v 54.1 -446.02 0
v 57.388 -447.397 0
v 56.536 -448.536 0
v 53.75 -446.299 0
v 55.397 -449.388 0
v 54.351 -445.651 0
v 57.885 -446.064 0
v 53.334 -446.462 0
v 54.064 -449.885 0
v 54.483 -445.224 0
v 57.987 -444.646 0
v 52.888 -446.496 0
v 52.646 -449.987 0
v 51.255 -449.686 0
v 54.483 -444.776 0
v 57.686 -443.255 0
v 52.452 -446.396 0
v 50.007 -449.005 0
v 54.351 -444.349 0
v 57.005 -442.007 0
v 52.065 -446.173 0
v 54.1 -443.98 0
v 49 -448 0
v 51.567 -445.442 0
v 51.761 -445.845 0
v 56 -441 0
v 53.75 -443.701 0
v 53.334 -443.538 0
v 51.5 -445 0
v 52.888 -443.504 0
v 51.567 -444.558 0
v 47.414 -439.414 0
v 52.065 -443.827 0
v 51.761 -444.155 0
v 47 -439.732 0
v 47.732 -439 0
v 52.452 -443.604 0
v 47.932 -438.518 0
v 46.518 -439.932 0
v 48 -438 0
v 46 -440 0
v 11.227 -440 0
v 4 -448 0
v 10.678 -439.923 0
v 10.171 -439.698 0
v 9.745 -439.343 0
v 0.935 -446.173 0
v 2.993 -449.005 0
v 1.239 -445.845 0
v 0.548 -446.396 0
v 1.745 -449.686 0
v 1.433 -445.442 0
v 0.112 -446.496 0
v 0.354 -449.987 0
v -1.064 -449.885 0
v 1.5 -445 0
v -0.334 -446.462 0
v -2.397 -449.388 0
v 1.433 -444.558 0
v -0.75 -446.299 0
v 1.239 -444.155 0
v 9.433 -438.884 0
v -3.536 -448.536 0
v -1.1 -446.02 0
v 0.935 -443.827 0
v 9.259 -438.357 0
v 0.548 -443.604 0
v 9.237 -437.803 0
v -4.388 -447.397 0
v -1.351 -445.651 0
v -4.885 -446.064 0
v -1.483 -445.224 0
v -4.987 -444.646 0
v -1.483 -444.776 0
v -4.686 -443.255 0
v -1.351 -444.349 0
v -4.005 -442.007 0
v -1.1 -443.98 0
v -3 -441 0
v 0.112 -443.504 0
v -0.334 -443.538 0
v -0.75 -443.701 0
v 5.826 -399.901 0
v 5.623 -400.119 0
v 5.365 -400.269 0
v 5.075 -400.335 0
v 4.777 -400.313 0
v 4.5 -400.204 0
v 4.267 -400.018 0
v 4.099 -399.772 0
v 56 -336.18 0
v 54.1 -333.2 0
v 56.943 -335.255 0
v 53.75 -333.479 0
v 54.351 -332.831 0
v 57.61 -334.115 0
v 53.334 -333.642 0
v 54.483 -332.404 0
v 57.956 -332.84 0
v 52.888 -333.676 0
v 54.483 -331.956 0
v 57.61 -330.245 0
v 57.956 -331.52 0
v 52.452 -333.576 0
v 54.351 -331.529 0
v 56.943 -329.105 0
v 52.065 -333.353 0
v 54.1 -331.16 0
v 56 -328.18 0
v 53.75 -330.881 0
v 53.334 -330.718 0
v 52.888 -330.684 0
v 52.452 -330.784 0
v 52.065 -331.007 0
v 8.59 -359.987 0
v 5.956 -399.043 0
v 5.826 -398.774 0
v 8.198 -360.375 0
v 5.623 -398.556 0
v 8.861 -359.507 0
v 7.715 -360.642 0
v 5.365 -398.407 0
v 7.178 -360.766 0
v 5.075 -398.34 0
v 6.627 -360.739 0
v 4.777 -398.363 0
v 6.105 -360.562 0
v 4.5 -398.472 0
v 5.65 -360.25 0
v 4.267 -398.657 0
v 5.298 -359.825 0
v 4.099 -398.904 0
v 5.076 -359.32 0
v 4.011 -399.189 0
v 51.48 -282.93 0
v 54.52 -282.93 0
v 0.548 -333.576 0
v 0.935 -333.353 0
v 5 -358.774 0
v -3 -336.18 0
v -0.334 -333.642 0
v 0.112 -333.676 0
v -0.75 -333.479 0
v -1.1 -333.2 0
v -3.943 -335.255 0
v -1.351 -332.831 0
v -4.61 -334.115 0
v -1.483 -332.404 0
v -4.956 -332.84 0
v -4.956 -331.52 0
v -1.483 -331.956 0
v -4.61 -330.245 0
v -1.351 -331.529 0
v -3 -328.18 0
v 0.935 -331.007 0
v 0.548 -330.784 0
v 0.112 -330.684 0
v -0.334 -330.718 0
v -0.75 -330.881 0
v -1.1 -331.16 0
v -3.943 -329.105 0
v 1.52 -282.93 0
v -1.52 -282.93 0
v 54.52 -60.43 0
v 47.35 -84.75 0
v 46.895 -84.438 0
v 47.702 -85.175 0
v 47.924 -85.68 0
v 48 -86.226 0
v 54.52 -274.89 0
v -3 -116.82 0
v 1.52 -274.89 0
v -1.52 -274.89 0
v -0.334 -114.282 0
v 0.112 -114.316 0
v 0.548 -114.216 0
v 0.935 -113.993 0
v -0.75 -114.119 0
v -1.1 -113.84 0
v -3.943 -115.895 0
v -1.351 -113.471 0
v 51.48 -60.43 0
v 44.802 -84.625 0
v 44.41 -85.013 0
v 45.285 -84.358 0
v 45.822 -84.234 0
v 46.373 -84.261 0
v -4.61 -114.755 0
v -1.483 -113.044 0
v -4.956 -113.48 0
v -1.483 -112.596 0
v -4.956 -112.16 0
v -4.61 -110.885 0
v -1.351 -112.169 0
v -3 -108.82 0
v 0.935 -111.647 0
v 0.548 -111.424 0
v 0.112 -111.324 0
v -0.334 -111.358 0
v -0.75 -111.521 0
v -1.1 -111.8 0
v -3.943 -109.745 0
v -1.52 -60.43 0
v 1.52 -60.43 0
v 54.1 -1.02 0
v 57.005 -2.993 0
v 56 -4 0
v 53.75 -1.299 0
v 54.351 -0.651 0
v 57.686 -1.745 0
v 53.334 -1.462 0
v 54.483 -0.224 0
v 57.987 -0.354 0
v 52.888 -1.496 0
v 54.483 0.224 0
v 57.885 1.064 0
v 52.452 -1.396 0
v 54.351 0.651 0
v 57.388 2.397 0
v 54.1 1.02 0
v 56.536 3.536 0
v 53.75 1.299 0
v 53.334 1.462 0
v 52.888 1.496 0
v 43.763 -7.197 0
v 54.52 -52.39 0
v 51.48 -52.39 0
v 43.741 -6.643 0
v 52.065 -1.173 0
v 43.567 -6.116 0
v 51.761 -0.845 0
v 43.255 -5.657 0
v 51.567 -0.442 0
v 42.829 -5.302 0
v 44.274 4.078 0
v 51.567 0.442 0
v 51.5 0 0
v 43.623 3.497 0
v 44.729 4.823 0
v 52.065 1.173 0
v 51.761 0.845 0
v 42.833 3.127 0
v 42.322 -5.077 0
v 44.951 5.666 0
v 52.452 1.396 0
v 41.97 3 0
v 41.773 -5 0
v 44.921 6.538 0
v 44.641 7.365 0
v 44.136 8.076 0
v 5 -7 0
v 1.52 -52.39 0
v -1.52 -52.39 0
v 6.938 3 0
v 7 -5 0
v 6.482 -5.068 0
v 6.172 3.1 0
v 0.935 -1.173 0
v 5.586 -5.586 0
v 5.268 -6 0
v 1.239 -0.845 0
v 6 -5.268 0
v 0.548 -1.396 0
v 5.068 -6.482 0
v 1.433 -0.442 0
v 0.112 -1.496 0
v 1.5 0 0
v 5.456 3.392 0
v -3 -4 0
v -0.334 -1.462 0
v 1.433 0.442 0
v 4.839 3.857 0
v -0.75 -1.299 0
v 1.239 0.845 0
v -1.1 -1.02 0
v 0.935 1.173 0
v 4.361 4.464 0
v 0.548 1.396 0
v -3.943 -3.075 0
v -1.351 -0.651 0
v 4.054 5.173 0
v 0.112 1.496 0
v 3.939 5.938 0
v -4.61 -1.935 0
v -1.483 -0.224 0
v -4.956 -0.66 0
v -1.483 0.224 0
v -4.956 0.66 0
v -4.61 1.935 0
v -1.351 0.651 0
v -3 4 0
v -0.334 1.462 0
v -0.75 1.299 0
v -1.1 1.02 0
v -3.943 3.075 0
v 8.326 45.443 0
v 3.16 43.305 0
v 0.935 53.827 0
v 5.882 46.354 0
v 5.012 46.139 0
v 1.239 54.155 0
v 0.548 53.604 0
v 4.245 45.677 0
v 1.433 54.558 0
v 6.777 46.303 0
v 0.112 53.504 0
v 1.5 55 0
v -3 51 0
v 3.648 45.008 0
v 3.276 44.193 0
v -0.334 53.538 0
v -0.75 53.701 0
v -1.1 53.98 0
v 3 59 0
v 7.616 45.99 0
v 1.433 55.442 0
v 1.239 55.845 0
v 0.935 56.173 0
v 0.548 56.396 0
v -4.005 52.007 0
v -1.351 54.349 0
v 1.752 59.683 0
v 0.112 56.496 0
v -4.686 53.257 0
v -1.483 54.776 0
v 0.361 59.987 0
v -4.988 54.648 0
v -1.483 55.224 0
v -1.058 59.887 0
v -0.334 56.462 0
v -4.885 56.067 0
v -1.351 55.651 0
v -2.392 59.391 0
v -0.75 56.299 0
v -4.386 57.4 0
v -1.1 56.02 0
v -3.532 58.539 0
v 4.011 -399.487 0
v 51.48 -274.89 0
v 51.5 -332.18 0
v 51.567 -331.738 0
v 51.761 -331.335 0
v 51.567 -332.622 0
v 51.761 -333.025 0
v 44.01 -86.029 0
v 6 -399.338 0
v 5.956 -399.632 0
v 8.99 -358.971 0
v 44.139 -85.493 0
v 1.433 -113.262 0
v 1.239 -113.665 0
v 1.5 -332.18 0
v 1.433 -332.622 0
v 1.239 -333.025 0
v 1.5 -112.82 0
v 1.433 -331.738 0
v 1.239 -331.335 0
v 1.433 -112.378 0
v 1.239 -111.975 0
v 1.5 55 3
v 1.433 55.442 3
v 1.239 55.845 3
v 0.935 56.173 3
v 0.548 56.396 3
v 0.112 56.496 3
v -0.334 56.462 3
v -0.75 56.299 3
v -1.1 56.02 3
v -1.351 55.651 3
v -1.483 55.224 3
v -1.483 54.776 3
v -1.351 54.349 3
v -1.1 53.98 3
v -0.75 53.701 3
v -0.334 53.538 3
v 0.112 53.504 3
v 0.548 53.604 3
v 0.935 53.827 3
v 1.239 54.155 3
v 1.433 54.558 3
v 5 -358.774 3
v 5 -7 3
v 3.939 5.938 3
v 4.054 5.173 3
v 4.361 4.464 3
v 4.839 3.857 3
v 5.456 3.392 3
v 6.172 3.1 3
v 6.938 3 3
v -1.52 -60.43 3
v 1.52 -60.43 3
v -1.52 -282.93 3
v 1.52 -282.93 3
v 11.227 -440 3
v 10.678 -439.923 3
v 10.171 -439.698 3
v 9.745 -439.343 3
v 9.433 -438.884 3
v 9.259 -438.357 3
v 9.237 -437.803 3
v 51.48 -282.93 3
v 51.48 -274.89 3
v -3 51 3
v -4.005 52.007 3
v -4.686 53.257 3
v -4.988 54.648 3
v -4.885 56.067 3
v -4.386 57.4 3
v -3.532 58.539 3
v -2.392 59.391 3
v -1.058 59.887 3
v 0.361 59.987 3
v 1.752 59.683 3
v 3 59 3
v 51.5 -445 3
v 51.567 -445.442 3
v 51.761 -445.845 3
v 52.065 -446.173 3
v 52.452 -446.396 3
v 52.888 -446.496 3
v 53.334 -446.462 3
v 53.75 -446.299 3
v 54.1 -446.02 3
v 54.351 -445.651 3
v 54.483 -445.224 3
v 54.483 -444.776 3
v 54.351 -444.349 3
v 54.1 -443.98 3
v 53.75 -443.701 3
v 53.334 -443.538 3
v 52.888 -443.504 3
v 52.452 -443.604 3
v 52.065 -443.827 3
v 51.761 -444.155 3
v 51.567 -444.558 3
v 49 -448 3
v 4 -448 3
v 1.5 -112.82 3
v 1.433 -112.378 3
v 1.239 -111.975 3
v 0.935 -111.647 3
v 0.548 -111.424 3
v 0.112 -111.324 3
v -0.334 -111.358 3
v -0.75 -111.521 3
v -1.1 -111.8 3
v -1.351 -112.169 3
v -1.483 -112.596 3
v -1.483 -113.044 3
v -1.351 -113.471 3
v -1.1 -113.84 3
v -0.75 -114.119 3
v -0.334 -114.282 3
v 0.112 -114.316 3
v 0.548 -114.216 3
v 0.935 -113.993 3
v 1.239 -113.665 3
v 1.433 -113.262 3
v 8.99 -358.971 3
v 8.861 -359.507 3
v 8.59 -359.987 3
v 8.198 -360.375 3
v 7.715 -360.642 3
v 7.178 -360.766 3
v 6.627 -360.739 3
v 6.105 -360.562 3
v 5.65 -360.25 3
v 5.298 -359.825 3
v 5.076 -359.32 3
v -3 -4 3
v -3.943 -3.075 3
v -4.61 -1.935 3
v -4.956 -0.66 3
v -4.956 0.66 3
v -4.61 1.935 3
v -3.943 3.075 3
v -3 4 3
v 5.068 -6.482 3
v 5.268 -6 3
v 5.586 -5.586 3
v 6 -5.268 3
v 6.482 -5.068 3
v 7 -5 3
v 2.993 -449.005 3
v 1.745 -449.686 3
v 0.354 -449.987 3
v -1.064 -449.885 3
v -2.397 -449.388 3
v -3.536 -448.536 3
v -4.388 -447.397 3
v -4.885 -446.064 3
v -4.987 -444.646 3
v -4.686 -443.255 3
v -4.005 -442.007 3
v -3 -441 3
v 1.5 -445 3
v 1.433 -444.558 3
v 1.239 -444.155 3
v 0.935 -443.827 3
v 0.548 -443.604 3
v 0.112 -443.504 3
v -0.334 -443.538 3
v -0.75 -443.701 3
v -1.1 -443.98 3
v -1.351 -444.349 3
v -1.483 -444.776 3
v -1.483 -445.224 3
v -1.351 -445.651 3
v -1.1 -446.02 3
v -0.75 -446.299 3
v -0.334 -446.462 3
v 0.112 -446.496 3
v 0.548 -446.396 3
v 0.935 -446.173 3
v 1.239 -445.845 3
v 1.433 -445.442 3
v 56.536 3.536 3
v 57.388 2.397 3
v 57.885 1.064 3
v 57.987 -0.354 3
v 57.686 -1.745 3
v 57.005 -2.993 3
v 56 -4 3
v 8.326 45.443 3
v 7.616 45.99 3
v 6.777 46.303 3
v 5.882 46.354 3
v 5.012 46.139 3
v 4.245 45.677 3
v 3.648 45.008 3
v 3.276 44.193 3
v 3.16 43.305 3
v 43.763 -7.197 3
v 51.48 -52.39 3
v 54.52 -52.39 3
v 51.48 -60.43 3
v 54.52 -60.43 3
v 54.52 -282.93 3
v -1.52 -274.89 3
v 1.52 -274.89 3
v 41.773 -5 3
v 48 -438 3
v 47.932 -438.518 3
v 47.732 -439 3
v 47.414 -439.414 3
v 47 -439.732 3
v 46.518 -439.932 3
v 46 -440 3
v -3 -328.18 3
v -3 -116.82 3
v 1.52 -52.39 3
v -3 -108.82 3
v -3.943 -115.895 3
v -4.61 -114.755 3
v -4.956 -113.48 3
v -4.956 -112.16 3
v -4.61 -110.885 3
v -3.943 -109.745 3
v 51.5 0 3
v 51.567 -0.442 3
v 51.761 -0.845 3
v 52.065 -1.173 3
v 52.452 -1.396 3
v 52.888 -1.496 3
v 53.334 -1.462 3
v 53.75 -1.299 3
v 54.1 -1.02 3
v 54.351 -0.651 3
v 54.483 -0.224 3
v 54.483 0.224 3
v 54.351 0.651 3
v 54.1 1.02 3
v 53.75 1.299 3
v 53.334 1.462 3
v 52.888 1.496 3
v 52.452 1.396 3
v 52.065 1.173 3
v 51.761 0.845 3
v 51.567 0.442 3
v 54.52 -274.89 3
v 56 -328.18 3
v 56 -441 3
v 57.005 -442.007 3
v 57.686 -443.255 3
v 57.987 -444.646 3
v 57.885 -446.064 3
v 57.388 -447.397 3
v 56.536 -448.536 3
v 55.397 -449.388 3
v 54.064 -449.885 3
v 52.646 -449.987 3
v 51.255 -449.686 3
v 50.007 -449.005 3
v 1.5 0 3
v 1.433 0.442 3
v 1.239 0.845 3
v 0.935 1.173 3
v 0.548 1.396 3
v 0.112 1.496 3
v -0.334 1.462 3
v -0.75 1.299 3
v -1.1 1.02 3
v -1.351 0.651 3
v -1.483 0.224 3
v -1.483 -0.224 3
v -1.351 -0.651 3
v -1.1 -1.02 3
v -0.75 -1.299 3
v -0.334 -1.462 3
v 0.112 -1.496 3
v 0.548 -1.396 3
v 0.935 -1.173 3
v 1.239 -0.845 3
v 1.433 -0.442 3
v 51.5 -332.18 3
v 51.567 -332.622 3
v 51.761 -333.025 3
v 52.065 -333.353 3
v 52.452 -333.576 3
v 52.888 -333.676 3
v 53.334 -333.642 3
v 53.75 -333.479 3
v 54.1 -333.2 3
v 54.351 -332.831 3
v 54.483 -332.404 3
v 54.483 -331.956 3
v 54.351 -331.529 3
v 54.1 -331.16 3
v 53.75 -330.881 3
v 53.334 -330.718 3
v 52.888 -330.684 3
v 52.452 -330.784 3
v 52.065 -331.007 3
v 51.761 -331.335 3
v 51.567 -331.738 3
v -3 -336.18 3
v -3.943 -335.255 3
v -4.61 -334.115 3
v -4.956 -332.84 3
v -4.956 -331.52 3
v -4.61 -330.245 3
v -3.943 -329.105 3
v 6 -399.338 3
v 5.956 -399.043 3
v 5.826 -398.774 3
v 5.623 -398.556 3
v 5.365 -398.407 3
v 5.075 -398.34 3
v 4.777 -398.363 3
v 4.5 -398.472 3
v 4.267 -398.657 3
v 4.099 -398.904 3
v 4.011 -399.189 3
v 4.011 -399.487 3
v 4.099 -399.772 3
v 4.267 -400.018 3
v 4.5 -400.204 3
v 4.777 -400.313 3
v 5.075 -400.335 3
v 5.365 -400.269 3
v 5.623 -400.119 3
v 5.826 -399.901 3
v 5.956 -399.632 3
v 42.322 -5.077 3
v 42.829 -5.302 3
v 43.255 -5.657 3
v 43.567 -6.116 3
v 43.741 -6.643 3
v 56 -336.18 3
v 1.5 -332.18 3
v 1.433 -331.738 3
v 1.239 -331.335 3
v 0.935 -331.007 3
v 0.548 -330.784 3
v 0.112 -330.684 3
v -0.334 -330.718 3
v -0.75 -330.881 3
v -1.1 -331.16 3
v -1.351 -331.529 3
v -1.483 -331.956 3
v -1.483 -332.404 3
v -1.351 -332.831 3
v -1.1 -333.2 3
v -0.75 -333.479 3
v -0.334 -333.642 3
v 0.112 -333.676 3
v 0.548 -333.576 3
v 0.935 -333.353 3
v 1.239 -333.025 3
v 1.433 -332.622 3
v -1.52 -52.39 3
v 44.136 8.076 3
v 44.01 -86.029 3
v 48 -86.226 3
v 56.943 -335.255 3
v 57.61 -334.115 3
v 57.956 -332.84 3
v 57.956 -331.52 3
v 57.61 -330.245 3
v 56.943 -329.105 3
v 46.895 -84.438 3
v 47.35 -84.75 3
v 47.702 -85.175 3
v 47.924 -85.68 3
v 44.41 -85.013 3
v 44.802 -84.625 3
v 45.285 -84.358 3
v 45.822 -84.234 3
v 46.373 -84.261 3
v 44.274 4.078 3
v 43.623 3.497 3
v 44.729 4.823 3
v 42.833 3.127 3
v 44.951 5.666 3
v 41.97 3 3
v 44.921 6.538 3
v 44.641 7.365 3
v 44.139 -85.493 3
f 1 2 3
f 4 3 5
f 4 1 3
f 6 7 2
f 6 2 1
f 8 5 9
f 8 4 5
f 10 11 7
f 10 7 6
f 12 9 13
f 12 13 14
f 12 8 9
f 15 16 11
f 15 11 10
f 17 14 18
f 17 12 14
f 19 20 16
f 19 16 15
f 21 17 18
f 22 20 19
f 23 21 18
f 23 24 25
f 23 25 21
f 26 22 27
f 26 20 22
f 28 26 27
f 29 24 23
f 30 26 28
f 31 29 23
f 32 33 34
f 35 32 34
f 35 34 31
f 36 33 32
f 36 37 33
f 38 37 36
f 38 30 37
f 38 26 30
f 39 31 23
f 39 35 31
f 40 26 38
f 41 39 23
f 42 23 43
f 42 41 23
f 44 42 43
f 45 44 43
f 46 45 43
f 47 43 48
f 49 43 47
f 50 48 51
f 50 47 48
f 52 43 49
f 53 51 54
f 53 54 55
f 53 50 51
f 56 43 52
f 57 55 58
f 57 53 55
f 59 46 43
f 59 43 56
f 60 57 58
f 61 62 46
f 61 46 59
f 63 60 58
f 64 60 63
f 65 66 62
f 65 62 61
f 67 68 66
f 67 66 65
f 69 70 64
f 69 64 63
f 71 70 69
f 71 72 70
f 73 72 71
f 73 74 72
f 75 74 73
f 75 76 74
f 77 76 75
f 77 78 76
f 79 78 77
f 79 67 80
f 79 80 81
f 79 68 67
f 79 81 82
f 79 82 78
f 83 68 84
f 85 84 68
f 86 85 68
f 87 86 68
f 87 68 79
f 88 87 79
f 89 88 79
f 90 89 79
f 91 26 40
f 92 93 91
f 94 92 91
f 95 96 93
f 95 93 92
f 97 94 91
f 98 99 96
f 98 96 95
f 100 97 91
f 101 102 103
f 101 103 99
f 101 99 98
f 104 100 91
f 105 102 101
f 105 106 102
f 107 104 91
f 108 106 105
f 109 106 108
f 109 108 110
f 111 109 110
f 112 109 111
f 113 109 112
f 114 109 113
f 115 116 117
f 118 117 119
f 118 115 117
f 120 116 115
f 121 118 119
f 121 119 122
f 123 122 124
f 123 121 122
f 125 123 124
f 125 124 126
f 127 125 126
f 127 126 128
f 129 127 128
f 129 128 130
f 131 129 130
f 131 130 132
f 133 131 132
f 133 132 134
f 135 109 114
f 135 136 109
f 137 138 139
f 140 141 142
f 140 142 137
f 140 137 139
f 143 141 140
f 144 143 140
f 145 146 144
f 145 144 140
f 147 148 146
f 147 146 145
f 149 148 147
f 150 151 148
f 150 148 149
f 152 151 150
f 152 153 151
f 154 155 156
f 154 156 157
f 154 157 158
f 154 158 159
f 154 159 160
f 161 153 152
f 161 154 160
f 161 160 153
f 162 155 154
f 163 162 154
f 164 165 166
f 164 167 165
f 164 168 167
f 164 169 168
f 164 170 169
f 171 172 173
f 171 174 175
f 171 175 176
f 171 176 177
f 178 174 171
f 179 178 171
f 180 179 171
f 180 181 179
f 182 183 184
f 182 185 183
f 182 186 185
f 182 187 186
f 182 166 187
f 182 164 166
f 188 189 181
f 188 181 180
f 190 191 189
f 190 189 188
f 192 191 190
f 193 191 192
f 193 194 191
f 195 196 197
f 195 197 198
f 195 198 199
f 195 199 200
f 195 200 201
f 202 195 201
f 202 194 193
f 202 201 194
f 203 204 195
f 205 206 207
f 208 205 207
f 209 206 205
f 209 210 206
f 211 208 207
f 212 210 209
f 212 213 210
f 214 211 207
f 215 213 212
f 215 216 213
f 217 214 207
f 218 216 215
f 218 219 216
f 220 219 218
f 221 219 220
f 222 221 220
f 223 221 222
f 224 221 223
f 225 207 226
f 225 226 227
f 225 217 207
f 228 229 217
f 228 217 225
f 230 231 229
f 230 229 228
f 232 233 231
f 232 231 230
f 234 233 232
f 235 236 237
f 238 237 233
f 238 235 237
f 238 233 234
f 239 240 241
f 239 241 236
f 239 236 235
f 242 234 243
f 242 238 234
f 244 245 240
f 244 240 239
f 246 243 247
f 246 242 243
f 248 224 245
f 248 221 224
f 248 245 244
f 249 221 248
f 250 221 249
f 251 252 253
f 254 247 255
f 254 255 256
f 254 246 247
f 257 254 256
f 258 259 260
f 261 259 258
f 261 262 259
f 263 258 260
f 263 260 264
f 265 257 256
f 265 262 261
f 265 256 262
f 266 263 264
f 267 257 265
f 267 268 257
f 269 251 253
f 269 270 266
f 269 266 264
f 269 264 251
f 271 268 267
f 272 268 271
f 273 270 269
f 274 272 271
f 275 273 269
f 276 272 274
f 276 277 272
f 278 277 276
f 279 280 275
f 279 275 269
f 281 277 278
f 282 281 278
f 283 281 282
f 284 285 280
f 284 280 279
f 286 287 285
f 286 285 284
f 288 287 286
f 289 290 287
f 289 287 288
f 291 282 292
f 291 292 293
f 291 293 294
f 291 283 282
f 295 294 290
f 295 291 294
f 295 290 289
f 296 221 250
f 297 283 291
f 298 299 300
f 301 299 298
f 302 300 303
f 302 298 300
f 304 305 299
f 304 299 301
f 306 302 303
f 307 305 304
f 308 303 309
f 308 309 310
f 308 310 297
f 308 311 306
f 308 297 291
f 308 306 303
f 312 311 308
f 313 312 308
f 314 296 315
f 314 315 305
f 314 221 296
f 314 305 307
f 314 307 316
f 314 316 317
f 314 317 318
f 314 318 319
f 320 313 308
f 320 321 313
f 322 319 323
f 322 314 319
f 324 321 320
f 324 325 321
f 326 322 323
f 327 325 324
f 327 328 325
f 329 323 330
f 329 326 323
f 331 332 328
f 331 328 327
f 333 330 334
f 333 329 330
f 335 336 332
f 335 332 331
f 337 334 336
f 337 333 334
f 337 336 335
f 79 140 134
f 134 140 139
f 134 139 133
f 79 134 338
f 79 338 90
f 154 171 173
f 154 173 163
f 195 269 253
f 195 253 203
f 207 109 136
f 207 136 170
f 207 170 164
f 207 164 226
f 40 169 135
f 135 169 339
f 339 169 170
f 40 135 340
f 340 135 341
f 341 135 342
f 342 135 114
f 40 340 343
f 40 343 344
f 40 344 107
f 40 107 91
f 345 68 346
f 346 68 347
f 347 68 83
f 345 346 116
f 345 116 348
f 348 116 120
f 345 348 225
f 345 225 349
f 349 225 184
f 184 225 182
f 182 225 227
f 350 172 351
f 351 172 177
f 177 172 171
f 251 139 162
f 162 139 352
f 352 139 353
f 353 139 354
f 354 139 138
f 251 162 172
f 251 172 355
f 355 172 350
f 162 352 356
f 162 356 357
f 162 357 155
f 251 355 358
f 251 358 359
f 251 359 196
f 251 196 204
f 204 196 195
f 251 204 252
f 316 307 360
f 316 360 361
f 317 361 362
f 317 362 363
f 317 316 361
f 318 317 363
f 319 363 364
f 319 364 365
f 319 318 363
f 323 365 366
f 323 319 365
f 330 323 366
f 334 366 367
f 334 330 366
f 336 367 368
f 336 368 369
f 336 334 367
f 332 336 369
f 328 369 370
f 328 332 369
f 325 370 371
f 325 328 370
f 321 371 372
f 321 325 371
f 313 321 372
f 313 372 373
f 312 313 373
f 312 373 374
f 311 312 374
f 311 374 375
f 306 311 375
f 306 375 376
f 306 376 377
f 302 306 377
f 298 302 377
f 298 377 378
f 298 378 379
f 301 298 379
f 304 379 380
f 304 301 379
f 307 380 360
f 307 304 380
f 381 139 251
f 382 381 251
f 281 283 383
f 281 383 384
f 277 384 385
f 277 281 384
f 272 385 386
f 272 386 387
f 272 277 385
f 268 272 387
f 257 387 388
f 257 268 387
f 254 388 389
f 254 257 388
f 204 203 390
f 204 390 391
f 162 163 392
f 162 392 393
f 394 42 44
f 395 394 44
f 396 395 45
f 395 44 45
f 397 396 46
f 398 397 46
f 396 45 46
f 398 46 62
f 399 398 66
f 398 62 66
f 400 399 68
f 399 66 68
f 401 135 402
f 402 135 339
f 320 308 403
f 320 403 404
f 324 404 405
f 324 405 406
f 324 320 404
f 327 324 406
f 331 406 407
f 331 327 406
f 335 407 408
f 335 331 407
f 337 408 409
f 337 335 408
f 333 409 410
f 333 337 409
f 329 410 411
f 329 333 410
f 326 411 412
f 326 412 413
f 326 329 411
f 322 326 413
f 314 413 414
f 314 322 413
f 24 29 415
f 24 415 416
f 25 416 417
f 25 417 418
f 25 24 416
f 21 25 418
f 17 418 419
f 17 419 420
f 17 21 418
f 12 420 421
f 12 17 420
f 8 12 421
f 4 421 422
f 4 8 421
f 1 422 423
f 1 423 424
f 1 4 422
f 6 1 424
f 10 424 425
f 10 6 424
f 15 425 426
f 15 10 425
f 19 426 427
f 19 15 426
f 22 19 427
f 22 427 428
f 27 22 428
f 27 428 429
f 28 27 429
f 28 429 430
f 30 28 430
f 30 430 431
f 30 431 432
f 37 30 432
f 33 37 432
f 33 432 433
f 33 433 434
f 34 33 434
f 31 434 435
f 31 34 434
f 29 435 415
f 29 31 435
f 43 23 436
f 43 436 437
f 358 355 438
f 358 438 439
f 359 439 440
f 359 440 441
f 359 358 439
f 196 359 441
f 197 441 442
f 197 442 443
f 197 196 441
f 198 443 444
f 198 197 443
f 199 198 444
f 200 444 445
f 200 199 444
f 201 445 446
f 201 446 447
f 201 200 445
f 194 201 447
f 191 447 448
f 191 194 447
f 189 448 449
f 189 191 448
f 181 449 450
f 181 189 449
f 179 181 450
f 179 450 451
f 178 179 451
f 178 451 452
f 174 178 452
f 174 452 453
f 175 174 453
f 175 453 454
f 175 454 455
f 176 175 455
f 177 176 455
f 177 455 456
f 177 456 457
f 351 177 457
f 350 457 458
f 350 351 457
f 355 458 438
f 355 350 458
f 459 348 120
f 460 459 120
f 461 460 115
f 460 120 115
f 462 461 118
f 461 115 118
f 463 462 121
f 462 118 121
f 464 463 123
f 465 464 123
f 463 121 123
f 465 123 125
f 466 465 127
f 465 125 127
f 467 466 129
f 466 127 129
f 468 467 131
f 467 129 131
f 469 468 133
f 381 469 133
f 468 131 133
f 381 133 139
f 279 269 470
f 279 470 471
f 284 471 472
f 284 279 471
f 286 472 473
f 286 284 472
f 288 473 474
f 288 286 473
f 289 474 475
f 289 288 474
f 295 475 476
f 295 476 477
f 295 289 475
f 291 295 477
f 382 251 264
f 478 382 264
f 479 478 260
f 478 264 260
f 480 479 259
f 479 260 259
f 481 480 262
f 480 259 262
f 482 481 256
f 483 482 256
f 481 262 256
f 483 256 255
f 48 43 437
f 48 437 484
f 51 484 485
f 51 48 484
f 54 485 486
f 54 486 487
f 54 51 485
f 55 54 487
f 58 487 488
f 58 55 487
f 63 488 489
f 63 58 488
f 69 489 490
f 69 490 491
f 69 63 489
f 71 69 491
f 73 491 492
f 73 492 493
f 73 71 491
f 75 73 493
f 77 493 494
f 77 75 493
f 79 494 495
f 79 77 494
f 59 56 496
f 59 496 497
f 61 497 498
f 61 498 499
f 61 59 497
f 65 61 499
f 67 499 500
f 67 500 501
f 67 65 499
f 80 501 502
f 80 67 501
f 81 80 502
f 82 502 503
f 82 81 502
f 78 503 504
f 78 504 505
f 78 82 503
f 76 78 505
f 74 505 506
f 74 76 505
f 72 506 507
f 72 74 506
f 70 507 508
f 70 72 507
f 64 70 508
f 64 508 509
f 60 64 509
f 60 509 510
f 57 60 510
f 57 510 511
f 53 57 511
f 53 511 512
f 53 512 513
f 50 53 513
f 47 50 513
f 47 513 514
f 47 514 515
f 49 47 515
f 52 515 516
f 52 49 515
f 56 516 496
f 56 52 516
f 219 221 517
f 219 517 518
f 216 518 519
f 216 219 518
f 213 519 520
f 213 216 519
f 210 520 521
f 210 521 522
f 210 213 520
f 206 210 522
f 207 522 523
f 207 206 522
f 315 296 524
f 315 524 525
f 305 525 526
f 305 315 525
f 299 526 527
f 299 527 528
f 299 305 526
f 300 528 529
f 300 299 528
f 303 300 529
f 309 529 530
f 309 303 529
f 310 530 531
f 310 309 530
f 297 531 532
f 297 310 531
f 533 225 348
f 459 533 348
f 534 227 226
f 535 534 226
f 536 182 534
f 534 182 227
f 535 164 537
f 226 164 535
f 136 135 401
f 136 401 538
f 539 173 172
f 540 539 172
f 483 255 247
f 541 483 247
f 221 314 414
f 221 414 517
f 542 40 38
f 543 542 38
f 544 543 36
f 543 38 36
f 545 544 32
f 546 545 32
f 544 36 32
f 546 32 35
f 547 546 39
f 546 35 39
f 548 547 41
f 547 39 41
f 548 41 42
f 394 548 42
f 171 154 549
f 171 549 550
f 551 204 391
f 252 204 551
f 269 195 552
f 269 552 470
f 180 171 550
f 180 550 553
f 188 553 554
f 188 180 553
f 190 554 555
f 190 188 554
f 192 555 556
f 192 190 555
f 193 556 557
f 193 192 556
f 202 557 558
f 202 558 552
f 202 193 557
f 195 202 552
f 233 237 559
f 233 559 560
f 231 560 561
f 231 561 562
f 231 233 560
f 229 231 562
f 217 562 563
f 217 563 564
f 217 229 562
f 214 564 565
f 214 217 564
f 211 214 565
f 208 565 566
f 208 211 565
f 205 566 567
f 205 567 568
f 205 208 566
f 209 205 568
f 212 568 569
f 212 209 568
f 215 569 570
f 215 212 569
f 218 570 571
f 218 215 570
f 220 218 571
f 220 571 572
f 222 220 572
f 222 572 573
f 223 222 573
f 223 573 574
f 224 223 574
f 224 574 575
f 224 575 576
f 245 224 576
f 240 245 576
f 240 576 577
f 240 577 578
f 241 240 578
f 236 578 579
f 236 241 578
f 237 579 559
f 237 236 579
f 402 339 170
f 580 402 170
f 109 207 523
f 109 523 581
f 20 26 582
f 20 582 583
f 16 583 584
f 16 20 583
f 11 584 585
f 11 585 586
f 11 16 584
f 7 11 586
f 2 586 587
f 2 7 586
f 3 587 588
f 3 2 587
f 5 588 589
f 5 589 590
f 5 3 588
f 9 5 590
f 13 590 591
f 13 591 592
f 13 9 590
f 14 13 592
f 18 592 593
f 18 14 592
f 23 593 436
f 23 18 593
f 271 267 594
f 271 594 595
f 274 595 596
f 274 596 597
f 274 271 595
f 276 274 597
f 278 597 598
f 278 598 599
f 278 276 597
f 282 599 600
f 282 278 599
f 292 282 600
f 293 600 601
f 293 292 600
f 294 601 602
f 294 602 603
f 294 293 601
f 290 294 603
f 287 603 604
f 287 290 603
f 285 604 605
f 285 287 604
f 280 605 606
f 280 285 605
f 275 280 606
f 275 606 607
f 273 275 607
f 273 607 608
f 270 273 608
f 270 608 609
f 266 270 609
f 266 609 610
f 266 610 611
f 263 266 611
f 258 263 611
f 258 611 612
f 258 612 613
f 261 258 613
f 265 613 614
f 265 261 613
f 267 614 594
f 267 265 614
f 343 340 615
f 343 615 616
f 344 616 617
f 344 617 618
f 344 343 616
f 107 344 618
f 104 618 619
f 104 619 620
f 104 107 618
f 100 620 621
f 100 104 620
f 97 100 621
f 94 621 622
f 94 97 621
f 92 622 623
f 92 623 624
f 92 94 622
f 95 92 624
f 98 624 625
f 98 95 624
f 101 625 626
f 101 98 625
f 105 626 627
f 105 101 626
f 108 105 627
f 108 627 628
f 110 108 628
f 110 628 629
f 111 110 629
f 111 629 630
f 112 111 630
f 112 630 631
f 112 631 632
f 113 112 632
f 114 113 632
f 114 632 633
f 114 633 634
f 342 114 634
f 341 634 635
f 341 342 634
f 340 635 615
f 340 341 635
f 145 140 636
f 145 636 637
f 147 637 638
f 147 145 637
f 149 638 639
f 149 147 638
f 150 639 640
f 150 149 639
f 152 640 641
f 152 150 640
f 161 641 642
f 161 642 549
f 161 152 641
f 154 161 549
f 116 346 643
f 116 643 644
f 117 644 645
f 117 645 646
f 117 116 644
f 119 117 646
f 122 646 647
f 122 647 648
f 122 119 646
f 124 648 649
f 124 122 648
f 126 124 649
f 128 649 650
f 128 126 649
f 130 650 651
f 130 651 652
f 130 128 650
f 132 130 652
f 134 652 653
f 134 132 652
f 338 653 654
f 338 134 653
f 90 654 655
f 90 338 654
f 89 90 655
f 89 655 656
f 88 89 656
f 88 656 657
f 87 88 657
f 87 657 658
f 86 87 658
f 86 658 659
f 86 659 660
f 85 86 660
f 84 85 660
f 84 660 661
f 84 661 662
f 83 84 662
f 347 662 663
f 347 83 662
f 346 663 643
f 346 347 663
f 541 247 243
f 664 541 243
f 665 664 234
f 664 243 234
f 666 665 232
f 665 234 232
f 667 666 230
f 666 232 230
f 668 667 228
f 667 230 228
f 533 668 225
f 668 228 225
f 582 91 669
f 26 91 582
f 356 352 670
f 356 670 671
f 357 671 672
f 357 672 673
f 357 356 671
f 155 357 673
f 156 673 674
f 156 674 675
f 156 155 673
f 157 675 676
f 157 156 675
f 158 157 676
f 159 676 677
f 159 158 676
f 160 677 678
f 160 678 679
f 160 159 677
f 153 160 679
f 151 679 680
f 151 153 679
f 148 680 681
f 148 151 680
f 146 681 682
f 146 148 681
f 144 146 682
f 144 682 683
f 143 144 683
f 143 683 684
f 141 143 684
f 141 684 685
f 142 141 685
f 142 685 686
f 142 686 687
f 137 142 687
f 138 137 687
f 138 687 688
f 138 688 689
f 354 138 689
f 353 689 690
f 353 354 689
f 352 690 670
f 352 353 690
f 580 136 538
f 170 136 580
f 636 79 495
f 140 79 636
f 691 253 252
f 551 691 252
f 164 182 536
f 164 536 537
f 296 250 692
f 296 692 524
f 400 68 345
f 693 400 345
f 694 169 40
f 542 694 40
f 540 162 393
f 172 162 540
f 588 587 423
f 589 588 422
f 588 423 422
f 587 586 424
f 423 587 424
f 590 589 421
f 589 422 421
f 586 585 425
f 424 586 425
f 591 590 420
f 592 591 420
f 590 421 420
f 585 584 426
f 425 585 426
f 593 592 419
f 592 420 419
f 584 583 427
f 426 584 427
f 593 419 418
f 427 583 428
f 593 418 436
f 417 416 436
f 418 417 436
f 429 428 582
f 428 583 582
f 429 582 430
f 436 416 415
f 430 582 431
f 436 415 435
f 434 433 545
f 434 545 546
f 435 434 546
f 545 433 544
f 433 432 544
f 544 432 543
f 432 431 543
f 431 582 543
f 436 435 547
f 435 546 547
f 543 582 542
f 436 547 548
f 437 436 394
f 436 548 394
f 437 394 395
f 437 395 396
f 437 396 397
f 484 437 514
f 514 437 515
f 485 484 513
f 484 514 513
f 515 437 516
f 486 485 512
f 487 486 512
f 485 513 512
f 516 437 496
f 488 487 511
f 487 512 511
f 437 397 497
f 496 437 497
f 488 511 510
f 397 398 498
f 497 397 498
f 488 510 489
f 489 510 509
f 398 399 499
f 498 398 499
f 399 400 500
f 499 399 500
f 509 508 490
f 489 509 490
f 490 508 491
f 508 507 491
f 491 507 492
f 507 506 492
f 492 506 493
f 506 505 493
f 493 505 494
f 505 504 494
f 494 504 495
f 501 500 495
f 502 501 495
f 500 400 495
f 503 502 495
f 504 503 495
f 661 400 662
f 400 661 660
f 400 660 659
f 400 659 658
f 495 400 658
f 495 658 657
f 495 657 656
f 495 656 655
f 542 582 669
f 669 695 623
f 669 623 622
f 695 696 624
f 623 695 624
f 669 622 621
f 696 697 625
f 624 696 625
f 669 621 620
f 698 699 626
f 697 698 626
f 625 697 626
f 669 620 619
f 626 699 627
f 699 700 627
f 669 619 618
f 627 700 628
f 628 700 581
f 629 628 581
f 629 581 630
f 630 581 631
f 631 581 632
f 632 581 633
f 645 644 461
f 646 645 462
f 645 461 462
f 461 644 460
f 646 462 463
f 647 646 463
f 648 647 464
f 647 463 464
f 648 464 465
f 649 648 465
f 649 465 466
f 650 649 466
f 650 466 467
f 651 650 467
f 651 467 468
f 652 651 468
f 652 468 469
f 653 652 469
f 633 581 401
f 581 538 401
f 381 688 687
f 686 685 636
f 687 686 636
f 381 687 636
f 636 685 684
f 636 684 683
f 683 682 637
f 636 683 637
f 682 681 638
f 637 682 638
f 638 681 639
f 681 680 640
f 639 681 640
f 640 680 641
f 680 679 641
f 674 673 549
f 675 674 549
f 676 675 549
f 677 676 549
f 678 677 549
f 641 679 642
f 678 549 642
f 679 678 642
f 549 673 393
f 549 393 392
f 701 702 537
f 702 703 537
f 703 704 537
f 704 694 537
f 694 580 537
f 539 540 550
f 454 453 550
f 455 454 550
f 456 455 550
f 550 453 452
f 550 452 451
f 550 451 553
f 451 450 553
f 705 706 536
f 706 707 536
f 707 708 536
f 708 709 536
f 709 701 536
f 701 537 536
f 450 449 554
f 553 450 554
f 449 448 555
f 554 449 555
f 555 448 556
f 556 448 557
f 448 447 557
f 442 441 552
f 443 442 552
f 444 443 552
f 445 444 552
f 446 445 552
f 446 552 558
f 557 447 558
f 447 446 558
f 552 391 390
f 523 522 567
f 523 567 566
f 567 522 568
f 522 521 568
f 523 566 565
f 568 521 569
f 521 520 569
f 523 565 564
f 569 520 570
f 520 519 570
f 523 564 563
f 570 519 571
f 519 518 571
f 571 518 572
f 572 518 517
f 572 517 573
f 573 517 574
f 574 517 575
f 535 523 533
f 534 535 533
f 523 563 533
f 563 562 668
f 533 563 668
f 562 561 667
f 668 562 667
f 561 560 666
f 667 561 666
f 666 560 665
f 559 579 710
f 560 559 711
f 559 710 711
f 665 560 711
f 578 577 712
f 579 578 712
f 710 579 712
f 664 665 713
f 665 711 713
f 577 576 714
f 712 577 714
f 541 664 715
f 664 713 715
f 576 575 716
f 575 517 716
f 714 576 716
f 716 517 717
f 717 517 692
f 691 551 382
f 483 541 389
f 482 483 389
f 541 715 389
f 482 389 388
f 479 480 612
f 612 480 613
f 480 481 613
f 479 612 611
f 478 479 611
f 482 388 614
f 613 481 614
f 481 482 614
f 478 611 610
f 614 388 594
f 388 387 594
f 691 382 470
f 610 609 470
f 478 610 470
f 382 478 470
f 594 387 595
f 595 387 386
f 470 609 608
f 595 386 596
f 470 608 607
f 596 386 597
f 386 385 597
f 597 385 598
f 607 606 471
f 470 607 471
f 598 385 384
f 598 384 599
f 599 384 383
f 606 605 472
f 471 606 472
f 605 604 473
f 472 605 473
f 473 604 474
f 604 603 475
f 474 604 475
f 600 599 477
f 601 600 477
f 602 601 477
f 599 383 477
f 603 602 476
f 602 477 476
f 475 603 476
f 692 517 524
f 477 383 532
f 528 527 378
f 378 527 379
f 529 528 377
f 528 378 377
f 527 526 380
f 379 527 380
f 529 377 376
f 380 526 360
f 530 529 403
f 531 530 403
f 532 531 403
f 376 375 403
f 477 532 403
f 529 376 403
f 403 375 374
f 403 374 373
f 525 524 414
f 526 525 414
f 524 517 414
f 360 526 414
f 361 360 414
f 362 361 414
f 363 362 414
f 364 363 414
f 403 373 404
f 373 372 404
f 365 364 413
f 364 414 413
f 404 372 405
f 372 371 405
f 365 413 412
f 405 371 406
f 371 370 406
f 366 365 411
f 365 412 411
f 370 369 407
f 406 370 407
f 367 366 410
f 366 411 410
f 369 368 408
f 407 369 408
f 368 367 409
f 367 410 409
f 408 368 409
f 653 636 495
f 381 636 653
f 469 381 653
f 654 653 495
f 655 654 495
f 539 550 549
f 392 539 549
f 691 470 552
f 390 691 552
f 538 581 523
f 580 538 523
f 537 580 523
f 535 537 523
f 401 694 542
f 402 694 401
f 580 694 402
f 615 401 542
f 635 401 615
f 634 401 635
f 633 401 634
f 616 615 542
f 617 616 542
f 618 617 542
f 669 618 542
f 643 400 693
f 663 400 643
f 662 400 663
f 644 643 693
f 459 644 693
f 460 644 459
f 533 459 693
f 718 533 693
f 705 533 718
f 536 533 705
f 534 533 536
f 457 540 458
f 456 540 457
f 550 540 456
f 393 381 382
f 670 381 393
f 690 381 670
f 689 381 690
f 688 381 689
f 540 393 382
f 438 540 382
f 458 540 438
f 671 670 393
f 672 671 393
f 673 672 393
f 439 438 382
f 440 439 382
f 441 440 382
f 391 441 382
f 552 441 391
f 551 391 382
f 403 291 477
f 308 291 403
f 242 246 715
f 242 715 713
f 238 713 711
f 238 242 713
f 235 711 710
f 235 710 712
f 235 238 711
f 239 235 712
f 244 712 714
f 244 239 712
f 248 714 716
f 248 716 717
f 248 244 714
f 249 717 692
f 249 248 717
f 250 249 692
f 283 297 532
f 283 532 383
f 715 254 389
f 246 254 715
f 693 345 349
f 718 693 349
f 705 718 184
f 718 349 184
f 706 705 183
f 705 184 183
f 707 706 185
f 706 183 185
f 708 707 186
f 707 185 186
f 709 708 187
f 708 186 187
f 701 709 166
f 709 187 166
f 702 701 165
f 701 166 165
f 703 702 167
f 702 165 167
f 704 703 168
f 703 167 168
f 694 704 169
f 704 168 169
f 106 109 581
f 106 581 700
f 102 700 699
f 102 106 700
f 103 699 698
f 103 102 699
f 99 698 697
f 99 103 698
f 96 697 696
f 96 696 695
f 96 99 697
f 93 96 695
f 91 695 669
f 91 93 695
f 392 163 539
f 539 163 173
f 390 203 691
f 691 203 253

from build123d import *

# Parameters (mm, degrees)
SKETCH_1_R      = 1.5
SKETCH_1_R_2    = 1
SKETCH_1_W      = 3.04
SKETCH_1_H      = 8.04
EXTRUDE_1_DEPTH = 3


with BuildPart() as part:
    # 草图1 → 凸台-拉伸1 (new body)
    with BuildSketch(Plane.XY):
        with BuildLine():
            Line((56, -336.18), (56, -441))
            ThreePointArc((56, -441), (56.535533906, -448.535533906), (49, -448))
            Line((49, -448), (4, -448))
            ThreePointArc((4, -448), (-3.535533906, -448.535533906), (-3, -441))
            Line((-3, -441), (-3, -438.832903769))
            Line((-3, -438.832903769), (-3, -429.017949192))
            Line((-3, -429.017949192), (-3, -336.18))
            ThreePointArc((-3, -336.18), (-5, -332.18), (-3, -328.18))
            Line((-3, -328.18), (-3, -116.82))
            ThreePointArc((-3, -116.82), (-5, -112.82), (-3, -108.82))
            Line((-3, -108.82), (-3, -4))
            ThreePointArc((-3, -4), (-5, 0), (-3, 4))
            Line((-3, 4), (-3, 51))
            ThreePointArc((-3, 51), (-4, 58), (3, 59))
            Line((3, 59), (56.535533906, 3.535533906))
            ThreePointArc((56.535533906, 3.535533906), (57.987421044, -0.3544451), (56, -4))
            Line((56, -4), (56, -328.18))
            ThreePointArc((56, -328.18), (58, -332.18), (56, -336.18))
        make_face()
        Circle(SKETCH_1_R, mode=Mode.SUBTRACT)
        with Locations((0, -445)):
            Circle(SKETCH_1_R, mode=Mode.SUBTRACT)
        with Locations((0, -332.18)):
            Circle(SKETCH_1_R, mode=Mode.SUBTRACT)
        with Locations(Location((53, -332.18, 0), (0, 0, 180))):
            Circle(SKETCH_1_R, mode=Mode.SUBTRACT)
        with Locations(Location((53, -445, 0), (0, 0, 180))):
            Circle(SKETCH_1_R, mode=Mode.SUBTRACT)
        with Locations(Location((53, 0, 0), (0, 0, 180))):
            Circle(SKETCH_1_R, mode=Mode.SUBTRACT)
        with Locations((5, -399.337663182)):
            Circle(SKETCH_1_R_2, mode=Mode.SUBTRACT)
        with Locations((0, 55)):
            Circle(SKETCH_1_R, mode=Mode.SUBTRACT)
        with Locations((0, -112.82)):
            Circle(SKETCH_1_R, mode=Mode.SUBTRACT)
        with BuildLine():
            Line((6.938150971, 3), (41.969807465, 3))
            ThreePointArc((41.969807465, 3), (44.729078046, 4.822534134), (44.135772081, 8.07571609))
            Line((44.135772081, 8.07571609), (8.325634331, 45.44281635))
            ThreePointArc((8.325634331, 45.44281635), (5.012233456, 46.138993121), (3.160320545, 43.30461382))
            Line((3.160320545, 43.30461382), (3.938801801, 5.937513559))
            ThreePointArc((3.938801801, 5.937513559), (4.839039174, 3.85670122), (6.938150971, 3))
        make_face(mode=Mode.SUBTRACT)
        with BuildLine():
            Line((48, -86.226063366), (48, -438))
            ThreePointArc((48, -438), (47.414213562, -439.414213562), (46, -440))
            Line((46, -440), (11.226944195, -440))
            ThreePointArc((11.226944195, -440), (9.744803089, -439.342854326), (9.236644598, -437.803257741))
            Line((9.236644598, -437.803257741), (44.009700404, -86.029321107))
            ThreePointArc((44.009700404, -86.029321107), (46.098490627, -84.228489939), (48, -86.226063366))
        make_face(mode=Mode.SUBTRACT)
        with BuildLine():
            Line((43.763355402, -7.196742259), (8.990299596, -358.970678893))
            ThreePointArc((8.990299596, -358.970678893), (6.901509373, -360.771510061), (5, -358.773936634))
            Line((5, -358.773936634), (5, -7))
            ThreePointArc((5, -7), (5.585786438, -5.585786438), (7, -5))
            Line((7, -5), (41.773055805, -5))
            ThreePointArc((41.773055805, -5), (43.255196911, -5.657145674), (43.763355402, -7.196742259))
        make_face(mode=Mode.SUBTRACT)
        with Locations((53, -56.41)):
            Rectangle(SKETCH_1_W, SKETCH_1_H, mode=Mode.SUBTRACT)
        with Locations((0, -56.41)):
            Rectangle(SKETCH_1_W, SKETCH_1_H, mode=Mode.SUBTRACT)
        with Locations((53, -278.91)):
            Rectangle(SKETCH_1_W, SKETCH_1_H, mode=Mode.SUBTRACT)
        with Locations((0, -278.91)):
            Rectangle(SKETCH_1_W, SKETCH_1_H, mode=Mode.SUBTRACT)
    extrude(amount=EXTRUDE_1_DEPTH)


solid = part.part
